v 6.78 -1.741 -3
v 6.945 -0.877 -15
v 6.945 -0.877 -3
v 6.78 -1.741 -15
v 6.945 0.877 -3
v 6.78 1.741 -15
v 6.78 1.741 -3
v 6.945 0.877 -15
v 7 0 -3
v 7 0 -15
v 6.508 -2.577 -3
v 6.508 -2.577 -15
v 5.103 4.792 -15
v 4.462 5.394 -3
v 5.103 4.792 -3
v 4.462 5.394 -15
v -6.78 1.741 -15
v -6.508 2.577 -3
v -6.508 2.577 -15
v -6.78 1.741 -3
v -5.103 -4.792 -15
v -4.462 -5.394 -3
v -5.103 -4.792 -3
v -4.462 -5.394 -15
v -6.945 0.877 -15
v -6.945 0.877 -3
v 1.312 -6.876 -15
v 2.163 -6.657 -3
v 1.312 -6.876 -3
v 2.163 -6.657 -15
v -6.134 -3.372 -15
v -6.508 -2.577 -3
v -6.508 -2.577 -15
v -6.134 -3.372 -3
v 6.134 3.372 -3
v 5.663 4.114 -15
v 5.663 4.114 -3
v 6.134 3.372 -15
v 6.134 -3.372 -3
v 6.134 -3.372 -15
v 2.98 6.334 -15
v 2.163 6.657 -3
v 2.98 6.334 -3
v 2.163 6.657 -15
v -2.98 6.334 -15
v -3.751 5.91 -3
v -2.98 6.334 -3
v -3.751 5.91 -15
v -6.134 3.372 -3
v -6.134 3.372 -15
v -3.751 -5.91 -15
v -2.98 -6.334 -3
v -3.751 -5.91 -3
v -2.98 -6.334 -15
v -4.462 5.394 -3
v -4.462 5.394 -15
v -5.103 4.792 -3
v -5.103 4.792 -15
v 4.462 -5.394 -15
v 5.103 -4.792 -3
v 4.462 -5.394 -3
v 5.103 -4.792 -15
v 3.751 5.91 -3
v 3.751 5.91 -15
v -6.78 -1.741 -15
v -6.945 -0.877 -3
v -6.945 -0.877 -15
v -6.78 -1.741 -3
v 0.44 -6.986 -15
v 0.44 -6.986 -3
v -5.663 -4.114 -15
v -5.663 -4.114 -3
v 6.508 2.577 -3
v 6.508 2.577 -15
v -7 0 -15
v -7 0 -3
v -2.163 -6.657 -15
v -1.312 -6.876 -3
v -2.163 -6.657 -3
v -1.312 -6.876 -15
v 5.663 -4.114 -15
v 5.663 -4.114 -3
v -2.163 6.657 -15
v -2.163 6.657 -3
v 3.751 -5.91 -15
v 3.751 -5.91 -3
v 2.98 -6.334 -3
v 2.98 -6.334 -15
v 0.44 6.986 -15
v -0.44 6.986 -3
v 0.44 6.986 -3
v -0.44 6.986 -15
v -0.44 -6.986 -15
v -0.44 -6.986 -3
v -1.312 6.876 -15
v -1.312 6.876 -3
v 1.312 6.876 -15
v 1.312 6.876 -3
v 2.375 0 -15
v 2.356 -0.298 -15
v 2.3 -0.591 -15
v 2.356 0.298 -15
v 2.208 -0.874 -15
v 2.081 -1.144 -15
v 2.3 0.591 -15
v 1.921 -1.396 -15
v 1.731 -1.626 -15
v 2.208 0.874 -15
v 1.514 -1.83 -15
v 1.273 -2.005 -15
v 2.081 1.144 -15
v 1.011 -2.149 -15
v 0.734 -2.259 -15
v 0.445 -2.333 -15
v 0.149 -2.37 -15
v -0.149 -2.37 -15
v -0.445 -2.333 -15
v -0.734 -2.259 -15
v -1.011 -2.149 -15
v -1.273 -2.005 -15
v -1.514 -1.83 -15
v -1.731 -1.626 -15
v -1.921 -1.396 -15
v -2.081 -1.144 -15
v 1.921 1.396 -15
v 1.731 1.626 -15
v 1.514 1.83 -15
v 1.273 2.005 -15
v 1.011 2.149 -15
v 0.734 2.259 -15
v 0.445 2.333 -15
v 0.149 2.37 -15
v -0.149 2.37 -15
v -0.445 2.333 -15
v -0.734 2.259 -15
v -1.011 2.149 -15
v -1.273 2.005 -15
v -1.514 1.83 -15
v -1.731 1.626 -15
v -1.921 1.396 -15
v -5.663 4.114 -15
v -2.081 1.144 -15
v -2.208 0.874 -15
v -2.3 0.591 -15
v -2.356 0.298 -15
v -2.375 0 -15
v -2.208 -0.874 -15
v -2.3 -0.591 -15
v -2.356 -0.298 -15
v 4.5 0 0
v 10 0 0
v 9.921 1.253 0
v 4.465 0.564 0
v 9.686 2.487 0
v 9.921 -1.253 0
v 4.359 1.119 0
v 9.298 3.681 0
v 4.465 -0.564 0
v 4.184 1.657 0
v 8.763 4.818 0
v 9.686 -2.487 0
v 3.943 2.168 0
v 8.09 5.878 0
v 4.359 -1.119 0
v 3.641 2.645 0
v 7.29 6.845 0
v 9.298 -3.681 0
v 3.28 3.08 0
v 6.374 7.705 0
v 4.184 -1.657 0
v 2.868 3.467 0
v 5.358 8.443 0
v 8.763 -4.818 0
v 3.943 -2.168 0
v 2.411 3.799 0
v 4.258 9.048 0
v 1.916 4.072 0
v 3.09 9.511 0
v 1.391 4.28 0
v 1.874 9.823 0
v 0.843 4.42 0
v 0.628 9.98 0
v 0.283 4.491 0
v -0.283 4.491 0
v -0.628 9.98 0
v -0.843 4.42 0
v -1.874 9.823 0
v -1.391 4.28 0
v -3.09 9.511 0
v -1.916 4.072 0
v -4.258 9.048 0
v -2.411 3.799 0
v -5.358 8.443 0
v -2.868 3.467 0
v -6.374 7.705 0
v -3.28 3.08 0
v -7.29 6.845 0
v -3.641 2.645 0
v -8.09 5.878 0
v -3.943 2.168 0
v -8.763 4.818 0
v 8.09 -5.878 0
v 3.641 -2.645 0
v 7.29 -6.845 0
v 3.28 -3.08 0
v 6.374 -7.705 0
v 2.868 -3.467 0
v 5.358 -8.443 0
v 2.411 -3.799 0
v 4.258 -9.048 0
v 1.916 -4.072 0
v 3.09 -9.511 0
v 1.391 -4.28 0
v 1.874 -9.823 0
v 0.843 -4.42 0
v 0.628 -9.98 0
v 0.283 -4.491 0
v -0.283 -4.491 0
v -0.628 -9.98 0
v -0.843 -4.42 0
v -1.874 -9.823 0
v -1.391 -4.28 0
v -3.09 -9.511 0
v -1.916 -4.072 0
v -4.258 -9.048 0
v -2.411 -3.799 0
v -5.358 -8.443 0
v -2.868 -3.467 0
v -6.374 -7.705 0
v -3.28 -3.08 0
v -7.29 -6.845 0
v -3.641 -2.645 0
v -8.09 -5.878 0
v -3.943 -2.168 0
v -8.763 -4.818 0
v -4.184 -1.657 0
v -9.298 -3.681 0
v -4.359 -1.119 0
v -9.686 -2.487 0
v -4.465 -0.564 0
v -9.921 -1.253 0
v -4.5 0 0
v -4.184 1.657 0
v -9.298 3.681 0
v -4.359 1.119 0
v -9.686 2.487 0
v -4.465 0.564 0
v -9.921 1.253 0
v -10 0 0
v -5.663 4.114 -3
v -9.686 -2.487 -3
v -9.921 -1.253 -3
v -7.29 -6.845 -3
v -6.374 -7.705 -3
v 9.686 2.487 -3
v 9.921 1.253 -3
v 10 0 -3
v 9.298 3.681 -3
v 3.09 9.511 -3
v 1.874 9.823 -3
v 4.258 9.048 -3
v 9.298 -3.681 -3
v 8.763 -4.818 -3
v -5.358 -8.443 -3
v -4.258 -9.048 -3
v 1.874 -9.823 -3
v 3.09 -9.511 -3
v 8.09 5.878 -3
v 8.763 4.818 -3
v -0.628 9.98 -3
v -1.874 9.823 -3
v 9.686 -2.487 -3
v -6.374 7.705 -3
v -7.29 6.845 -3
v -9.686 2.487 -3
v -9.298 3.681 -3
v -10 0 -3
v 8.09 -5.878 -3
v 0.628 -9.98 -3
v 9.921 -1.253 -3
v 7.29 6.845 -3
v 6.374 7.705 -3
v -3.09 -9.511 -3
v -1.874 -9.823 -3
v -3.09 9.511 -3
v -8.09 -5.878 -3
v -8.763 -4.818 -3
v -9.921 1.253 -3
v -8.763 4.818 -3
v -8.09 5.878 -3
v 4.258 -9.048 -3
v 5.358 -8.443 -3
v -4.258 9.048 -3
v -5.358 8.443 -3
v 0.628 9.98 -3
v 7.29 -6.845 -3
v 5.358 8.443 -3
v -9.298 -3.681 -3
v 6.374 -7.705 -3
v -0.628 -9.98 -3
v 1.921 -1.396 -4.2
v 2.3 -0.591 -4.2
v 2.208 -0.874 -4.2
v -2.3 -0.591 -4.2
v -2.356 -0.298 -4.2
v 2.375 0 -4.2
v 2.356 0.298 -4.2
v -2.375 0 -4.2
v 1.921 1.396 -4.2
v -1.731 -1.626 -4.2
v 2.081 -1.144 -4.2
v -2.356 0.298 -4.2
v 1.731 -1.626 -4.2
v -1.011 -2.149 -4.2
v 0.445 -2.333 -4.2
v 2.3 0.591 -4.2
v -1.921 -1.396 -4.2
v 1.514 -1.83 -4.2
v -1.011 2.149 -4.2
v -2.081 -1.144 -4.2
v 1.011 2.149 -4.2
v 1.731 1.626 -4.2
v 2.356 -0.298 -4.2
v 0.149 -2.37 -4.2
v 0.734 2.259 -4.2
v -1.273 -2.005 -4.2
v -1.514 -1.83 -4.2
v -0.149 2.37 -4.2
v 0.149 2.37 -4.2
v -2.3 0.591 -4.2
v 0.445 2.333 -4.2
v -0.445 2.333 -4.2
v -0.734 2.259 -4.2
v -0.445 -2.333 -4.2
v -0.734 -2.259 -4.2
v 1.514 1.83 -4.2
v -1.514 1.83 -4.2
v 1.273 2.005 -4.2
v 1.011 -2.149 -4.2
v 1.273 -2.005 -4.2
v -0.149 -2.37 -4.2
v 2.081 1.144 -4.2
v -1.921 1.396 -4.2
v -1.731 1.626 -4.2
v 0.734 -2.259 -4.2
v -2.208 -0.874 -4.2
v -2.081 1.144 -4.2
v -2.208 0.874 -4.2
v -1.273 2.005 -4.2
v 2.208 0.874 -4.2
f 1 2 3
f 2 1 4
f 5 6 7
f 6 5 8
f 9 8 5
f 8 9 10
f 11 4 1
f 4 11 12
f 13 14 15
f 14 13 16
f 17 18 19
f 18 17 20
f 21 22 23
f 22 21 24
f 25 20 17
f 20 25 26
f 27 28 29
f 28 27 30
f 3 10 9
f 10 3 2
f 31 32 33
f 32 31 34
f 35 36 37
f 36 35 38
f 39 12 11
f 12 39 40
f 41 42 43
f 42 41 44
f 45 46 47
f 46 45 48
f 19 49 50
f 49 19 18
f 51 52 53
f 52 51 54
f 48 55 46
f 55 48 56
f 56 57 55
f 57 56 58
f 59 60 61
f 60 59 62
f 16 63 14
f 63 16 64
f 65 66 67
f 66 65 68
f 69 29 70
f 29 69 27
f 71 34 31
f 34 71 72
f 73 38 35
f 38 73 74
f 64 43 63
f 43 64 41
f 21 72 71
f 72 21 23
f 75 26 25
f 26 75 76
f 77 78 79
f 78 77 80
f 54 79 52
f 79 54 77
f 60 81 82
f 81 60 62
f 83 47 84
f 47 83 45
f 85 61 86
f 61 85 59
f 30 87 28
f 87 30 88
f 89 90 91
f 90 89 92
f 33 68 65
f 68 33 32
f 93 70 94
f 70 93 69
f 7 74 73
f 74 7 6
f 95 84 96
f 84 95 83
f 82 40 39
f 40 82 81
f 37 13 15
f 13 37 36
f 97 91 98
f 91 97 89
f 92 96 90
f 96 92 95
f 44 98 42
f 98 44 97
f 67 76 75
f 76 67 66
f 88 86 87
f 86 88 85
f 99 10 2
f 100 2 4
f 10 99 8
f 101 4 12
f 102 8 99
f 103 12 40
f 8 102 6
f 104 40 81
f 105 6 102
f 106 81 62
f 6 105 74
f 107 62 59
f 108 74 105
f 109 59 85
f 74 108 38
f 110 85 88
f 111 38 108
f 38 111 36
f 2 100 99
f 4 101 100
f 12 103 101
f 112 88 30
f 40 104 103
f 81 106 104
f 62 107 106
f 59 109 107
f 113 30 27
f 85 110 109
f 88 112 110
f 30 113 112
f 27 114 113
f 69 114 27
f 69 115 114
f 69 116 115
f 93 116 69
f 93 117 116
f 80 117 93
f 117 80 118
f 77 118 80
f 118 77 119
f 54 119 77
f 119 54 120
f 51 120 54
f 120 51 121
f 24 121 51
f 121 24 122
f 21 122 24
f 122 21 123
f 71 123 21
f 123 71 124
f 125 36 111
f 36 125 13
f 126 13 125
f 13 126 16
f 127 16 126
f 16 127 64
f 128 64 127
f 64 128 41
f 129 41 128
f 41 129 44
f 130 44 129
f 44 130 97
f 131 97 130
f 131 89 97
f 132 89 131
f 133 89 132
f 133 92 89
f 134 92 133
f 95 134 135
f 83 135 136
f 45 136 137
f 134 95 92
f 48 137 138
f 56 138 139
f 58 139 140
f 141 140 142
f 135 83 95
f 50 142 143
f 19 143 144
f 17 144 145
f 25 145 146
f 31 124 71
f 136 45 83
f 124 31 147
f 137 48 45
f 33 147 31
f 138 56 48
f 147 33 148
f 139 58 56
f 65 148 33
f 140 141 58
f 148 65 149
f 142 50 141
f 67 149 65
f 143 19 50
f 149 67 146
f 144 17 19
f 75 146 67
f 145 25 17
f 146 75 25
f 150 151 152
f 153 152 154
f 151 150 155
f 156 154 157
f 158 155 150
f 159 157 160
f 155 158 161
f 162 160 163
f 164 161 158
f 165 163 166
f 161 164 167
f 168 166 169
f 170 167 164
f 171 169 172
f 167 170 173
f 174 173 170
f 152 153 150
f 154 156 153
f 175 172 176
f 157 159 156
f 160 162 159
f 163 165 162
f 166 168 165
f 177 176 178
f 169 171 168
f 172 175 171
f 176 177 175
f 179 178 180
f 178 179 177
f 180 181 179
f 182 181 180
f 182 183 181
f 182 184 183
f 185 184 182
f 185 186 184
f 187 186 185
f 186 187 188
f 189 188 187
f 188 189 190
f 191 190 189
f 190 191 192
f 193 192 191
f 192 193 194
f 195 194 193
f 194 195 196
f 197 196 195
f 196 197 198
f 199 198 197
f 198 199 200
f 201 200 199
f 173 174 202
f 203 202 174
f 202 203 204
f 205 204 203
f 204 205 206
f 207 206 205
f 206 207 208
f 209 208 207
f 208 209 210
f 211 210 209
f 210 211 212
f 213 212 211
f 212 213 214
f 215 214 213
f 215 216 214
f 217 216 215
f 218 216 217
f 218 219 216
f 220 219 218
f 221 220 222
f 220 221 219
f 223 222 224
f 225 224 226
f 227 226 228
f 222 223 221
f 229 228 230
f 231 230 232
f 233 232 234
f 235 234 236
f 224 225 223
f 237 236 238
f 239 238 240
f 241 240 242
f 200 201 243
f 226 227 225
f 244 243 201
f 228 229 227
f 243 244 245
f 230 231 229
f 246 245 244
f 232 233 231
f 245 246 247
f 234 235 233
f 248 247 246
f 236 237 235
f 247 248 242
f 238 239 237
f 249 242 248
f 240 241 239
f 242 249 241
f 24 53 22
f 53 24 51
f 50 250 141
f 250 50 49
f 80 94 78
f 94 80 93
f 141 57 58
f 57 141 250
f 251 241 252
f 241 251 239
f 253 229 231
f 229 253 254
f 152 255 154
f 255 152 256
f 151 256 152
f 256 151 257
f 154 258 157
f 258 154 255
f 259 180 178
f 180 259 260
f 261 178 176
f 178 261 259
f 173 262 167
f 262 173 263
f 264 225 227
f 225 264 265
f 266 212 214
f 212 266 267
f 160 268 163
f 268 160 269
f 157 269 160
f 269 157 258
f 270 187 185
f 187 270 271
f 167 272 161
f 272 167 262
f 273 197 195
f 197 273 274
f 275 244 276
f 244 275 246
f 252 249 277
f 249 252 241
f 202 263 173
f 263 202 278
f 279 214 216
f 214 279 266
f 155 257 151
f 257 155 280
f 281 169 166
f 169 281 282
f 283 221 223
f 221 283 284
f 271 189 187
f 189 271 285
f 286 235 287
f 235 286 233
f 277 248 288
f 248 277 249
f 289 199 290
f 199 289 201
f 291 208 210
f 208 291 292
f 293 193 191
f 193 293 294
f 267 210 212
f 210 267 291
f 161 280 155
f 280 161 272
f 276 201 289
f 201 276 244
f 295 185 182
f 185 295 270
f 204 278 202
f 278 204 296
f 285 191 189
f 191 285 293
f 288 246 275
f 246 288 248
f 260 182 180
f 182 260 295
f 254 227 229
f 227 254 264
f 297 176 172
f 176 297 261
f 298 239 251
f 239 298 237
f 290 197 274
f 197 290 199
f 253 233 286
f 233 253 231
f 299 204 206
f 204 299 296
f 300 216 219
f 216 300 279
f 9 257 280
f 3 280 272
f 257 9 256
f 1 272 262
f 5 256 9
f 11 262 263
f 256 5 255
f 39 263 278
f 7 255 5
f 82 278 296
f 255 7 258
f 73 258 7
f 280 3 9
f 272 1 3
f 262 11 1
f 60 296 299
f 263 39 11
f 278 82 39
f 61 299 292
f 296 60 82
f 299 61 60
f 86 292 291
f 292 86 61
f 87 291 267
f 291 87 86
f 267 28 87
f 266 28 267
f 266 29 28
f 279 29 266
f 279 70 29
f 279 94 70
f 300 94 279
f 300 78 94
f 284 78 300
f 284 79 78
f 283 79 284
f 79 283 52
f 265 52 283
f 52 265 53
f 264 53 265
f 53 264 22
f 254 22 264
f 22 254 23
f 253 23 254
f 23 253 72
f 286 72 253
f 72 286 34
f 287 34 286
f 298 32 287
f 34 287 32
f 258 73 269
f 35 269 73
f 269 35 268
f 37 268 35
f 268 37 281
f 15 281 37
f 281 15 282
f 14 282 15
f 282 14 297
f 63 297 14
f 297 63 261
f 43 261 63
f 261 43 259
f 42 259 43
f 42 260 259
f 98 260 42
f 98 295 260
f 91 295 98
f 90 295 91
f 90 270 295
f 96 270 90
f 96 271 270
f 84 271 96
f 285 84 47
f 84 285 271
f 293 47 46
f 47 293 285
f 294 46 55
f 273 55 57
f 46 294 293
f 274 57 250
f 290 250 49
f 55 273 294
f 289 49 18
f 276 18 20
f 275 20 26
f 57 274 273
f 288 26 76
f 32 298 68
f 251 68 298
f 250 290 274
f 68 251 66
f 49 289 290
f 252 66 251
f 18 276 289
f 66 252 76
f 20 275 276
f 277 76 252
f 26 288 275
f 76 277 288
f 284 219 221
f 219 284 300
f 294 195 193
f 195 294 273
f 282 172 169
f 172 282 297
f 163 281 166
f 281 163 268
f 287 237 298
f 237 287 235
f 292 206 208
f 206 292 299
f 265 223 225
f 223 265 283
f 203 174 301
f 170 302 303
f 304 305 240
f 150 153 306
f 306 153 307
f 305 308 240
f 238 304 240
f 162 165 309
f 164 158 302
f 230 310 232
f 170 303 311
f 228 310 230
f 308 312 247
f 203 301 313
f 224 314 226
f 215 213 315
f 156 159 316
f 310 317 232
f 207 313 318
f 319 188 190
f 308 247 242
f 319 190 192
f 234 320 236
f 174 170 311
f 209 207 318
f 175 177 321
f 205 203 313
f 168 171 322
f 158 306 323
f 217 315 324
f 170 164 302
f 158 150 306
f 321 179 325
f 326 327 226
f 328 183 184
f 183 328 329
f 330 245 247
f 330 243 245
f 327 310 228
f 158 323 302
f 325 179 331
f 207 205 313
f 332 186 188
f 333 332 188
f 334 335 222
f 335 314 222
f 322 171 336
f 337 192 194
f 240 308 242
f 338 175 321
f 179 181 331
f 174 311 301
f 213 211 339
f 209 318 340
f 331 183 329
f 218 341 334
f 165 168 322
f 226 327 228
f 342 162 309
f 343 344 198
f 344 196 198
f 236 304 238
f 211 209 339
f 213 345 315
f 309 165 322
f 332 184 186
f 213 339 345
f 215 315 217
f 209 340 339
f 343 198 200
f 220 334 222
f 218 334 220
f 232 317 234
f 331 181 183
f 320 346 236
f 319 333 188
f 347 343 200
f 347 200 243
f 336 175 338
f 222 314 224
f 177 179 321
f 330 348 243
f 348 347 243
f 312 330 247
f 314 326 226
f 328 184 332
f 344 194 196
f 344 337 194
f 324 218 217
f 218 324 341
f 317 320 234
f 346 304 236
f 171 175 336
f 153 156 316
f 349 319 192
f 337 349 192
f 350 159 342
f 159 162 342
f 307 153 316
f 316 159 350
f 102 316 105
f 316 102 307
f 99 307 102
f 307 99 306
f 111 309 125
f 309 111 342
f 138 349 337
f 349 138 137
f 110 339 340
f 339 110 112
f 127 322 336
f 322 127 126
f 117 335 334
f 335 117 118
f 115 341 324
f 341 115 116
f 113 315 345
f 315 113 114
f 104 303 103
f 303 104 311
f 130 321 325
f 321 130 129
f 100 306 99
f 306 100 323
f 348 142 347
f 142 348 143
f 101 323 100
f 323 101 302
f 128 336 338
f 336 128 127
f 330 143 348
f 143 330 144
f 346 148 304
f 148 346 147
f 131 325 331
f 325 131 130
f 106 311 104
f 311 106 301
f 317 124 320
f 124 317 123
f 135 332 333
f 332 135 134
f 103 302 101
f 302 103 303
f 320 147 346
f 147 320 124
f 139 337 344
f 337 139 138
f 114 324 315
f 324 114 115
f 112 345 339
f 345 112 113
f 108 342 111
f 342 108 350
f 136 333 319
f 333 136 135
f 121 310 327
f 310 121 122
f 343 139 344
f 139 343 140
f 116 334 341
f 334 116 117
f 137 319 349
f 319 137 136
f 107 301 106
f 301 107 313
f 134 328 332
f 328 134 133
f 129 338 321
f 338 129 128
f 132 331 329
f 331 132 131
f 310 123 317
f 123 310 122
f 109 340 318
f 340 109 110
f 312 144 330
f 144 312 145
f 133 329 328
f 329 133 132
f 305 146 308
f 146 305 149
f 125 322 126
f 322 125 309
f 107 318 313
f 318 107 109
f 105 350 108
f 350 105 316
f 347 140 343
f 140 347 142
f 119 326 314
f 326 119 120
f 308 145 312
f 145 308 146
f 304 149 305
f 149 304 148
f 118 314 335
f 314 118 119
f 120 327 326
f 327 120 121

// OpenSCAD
$fn = 50;


difference() {
	union() {
		translate(v = [0, 0, -15.0000000000]) {
			cylinder(h = 15, r = 7.0000000000);
		}
		translate(v = [0, 0, -3.0000000000]) {
			cylinder(h = 3, r = 10.0000000000);
		}
	}
	union() {
		translate(v = [0, 0, 0]) {
			rotate(a = [0, 0, 0]) {
				difference() {
					union() {
						#translate(v = [0, 0, -15.0000000000]) {
							cylinder(h = 15, r = 2.2500000000);
						}
						#translate(v = [0, 0, -4.2000000000]) {
							cylinder(h = 4.2000000000, r1 = 2.3750000000, r2 = 4.5000000000);
						}
						#translate(v = [0, 0, -15.0000000000]) {
							cylinder(h = 15, r = 2.3750000000);
						}
						#translate(v = [0, 0, -15.0000000000]) {
							cylinder(h = 15, r = 2.2500000000);
						}
					}
					union();
				}
			}
		}
	}
}
